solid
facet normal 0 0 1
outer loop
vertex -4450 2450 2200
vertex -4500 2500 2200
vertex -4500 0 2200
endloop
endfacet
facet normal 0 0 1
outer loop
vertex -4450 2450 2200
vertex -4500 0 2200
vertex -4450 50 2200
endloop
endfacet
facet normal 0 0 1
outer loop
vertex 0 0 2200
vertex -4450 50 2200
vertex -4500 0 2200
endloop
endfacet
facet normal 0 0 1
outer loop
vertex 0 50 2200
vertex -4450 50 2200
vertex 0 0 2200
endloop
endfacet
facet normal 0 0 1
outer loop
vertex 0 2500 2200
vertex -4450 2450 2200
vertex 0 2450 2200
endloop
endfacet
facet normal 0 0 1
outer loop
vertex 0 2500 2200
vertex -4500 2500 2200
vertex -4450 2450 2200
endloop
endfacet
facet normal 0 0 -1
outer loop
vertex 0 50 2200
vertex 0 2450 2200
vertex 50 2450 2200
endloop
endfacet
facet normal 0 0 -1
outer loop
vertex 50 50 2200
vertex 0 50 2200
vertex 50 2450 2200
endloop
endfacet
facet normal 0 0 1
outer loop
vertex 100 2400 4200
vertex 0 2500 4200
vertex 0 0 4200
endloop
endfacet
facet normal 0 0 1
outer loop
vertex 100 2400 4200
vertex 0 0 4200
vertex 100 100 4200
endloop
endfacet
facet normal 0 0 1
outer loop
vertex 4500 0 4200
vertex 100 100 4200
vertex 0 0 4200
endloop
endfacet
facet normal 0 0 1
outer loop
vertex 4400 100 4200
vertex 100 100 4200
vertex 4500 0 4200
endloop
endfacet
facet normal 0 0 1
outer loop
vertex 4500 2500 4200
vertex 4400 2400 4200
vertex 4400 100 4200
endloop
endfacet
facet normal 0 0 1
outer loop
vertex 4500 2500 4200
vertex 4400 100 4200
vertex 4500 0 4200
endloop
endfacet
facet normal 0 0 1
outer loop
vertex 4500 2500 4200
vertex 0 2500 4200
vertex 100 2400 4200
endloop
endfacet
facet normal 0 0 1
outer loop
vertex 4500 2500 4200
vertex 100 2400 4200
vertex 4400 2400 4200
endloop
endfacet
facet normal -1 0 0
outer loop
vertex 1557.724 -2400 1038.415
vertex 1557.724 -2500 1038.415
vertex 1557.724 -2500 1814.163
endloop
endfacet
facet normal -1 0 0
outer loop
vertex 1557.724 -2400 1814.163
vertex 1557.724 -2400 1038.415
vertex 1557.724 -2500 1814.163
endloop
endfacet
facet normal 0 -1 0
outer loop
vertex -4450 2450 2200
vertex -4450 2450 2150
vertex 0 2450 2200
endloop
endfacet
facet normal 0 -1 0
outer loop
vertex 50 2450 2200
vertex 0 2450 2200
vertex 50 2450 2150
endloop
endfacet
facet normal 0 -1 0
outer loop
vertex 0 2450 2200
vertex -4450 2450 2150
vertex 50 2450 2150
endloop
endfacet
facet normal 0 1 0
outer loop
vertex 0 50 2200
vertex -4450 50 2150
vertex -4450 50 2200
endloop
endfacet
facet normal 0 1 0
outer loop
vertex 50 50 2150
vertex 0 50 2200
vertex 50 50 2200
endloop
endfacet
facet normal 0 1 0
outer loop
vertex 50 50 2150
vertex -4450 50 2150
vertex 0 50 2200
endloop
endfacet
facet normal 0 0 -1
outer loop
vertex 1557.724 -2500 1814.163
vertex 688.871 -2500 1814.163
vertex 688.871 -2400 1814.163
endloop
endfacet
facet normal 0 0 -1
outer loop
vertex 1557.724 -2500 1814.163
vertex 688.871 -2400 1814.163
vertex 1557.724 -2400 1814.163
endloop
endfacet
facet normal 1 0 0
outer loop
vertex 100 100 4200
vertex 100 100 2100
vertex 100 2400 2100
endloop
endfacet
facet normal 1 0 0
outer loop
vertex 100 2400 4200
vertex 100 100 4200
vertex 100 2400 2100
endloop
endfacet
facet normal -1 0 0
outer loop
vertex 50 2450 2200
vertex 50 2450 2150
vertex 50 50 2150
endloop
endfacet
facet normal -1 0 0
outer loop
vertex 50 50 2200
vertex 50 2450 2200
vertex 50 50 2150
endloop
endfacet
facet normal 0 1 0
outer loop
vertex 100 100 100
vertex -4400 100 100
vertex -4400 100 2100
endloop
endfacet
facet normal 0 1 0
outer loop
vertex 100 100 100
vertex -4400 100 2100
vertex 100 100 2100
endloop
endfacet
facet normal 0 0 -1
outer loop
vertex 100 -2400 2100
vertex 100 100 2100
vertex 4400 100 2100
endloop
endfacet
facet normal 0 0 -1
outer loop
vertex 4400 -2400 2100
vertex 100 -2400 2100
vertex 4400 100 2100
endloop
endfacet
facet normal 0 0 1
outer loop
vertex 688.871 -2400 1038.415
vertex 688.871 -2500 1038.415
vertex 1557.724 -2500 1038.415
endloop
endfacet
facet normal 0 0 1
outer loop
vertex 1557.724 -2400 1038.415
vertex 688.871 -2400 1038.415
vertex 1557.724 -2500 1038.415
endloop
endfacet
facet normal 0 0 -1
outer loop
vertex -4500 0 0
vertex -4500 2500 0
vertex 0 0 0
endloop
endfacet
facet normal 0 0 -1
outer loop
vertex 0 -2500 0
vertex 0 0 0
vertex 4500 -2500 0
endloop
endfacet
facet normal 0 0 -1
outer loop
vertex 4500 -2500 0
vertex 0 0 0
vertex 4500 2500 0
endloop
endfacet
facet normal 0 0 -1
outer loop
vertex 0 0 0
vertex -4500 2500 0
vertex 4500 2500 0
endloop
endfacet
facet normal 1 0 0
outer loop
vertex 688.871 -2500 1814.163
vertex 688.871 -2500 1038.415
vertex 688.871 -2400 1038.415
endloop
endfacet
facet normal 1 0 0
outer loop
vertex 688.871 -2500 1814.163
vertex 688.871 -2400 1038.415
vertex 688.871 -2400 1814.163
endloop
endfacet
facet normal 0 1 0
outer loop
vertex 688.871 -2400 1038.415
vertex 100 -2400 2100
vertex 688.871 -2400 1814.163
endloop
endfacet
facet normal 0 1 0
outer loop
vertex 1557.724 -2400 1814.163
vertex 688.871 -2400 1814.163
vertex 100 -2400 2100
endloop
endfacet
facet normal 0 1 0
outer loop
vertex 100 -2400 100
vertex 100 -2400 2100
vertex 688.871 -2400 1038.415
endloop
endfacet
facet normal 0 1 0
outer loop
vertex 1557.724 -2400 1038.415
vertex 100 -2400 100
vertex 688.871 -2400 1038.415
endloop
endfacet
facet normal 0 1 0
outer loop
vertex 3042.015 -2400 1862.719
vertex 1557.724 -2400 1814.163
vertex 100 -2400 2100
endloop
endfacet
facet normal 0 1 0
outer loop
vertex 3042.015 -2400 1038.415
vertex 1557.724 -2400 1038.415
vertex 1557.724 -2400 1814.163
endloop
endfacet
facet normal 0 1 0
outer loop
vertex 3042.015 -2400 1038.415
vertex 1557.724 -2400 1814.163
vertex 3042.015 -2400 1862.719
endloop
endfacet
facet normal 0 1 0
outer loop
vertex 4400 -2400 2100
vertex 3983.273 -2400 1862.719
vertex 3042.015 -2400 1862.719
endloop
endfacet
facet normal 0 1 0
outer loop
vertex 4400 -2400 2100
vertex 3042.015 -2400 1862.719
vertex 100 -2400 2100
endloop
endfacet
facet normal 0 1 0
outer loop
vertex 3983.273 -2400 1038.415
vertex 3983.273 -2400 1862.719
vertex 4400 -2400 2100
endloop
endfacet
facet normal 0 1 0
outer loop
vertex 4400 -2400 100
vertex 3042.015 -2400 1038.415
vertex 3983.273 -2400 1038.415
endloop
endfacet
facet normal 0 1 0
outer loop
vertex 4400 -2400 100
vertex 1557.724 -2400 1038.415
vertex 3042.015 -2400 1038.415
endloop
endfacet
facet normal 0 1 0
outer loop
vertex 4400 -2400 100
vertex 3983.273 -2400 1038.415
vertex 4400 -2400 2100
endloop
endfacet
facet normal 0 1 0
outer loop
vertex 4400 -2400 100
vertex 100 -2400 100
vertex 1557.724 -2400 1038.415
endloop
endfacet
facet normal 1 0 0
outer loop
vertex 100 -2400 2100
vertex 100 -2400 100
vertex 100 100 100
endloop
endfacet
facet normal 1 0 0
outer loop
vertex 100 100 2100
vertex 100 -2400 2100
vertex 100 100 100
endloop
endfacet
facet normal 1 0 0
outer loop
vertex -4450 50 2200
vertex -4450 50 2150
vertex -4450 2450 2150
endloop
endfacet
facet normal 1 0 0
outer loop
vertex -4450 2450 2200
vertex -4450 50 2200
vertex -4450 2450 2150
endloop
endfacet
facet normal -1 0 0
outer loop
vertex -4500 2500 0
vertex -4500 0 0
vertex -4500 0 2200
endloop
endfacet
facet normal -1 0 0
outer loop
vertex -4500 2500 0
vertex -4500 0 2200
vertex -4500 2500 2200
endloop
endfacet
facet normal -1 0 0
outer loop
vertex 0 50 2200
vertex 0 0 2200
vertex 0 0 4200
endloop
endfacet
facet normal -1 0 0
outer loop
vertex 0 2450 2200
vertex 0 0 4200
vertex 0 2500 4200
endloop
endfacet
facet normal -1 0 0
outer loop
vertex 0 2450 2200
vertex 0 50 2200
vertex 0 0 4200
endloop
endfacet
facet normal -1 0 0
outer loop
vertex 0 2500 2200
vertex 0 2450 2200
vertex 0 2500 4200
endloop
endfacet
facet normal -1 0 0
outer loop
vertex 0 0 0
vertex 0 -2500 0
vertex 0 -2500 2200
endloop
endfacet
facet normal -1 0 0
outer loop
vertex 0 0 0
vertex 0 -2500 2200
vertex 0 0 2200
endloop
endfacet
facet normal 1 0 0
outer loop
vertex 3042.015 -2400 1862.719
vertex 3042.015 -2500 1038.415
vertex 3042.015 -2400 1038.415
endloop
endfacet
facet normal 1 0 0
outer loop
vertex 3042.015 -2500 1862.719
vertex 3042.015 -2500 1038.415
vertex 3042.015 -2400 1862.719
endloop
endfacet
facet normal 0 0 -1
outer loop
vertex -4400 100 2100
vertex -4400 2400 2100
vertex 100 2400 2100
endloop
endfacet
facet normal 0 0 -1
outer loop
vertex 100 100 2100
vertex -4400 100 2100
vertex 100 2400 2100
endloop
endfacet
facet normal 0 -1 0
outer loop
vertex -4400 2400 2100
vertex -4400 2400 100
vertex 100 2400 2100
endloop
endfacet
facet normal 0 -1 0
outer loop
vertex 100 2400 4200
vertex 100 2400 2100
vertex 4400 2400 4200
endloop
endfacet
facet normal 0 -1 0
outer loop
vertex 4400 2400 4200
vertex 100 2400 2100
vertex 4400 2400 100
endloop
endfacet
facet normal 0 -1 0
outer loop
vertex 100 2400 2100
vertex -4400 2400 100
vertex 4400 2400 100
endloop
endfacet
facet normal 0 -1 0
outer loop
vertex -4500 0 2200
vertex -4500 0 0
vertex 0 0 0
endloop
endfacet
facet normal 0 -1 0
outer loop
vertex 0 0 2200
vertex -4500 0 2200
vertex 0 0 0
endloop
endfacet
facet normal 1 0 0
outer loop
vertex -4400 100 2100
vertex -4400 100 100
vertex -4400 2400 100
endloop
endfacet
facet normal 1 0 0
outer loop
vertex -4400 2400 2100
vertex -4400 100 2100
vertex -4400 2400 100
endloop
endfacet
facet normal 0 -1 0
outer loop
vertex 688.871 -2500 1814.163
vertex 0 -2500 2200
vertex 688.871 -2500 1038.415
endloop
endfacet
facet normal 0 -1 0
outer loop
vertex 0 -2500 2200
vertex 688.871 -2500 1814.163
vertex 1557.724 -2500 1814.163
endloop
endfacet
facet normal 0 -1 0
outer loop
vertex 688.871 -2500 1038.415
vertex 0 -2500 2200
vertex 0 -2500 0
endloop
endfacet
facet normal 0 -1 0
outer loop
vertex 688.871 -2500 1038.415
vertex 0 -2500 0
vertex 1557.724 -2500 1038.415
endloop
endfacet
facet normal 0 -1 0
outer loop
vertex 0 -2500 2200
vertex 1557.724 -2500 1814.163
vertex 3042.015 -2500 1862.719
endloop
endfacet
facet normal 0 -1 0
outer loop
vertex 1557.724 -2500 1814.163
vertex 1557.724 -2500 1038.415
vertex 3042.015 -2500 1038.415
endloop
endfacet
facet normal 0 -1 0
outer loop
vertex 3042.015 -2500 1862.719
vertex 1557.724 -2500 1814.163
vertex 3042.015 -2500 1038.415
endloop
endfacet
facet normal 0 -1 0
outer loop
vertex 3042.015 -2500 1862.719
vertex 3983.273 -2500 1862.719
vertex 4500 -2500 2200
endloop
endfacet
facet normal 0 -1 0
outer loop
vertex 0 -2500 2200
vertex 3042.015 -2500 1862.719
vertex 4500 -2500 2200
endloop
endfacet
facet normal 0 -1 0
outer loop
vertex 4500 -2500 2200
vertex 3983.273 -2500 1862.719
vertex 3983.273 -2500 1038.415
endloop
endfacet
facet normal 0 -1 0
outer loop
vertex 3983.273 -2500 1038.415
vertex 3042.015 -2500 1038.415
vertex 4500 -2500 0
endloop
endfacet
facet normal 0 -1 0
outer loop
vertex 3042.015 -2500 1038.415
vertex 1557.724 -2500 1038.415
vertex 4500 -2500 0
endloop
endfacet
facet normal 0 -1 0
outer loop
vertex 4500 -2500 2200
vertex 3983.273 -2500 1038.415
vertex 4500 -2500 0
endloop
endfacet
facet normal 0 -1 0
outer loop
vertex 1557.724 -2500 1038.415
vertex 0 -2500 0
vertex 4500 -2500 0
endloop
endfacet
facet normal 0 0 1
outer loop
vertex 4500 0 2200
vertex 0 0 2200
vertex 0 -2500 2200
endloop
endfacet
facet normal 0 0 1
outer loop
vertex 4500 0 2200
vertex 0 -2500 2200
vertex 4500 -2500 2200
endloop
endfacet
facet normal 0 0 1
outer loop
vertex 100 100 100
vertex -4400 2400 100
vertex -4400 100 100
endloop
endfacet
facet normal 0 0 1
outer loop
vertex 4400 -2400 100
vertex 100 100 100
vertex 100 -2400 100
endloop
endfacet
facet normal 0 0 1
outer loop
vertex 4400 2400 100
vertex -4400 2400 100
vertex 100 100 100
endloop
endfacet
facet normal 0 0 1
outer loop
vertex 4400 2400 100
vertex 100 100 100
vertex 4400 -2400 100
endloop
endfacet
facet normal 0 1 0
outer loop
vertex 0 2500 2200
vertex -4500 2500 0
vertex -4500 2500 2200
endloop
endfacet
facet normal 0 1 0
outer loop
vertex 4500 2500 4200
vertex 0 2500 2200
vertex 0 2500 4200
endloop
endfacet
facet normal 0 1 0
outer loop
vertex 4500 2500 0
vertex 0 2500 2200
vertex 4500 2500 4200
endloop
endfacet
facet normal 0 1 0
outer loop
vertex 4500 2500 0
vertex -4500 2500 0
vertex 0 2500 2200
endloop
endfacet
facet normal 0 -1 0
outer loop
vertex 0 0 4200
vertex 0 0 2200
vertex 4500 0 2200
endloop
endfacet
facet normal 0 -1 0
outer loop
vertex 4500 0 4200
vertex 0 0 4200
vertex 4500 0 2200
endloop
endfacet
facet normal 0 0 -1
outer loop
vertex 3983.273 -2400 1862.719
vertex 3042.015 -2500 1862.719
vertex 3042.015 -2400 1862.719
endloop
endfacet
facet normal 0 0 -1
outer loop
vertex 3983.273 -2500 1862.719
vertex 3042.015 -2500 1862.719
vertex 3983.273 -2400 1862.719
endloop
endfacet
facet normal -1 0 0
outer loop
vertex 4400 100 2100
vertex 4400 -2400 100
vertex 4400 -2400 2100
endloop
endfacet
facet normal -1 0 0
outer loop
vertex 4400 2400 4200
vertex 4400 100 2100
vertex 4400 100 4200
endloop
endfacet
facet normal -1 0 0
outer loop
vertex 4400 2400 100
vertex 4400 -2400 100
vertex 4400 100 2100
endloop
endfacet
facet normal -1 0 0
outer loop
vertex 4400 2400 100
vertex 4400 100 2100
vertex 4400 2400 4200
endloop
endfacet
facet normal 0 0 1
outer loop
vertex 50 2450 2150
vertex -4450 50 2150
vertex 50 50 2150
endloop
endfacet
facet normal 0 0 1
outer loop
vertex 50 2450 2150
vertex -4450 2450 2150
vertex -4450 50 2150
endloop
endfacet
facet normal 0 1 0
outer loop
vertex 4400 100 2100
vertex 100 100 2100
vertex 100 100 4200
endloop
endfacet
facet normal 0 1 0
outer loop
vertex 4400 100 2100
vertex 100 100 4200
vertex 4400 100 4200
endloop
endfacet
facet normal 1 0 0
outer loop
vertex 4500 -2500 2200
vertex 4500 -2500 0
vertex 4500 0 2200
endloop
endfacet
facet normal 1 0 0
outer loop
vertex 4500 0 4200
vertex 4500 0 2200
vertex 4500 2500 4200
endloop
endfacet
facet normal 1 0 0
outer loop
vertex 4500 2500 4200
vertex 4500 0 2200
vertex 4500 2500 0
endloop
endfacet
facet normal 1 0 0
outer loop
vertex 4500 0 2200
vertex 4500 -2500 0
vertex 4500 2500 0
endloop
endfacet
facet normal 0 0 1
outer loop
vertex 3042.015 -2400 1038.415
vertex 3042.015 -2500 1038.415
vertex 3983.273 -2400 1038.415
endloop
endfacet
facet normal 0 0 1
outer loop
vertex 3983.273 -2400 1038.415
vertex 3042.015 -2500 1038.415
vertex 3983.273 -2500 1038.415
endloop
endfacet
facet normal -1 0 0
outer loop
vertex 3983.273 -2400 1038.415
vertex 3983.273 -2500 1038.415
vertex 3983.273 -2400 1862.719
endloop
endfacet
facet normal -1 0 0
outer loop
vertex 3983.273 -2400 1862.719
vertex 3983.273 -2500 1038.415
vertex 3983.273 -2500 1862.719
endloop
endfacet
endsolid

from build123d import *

# Parameters (mm, degrees)
F0_W         = 4500
F0_H         = 2500
F1_DEPTH     = 4200
F2_DEPTH     = 2200
F3_DEPTH     = 2200
F4_T         = -100
F5_T         = 50
F5_T3_DEPTH  = 2300
F5_T5_DEPTH  = 4600
F5_T7_DEPTH  = 2200
F5_T9_DEPTH  = 4200
F5_T11_DEPTH = 8900
F5_T13_DEPTH = 2100
F5_T15_DEPTH = 4600
F5_T17_DEPTH = 4900
F5_T19_DEPTH = 4400
F5_T21_DEPTH = 2600
F5_T23_DEPTH = 2400
F6_W         = 868.8530921936
F6_H         = 775.7483720779
F6_W_2       = 941.2586688995
F6_H_2       = 824.3043422699
F7_DEPTH     = 100


# Not quite as in the source:
# - a shell that OpenCascade refuses in one call is made with other operations: the cavity is built on its own and cut out


with BuildPart() as f1:
    # F0 (on Top) → F1 (new body)
    with BuildSketch(Plane.XY):
        with Locations((2250, 1250)):
            Rectangle(F0_W, F0_H)
    extrude(amount=F1_DEPTH)

    # F0 (on Top) → F2 (join)
    with BuildSketch(Plane.XY):
        with Locations((2250, -1250)):
            Rectangle(F0_W, F0_H)
    extrude(amount=F2_DEPTH)

    # F0 (on Top) → F3 (join)
    with BuildSketch(Plane.XY):
        with Locations((-2250, 1250)):
            Rectangle(F0_W, F0_H)
    extrude(amount=F3_DEPTH)

    # F4
    f4_openings = [f1.faces().sort_by_distance(p)[0] for p in [
        (2250, 1250, 4200),
    ]]
    offset(amount=F4_T, openings=f4_openings, kind=Kind.INTERSECTION)

    # F5: shell of thickness 50, made by hand


with BuildPart() as f5_core1:
    # F5_t2: copy of F1
    add(f1.part)

    # the walls: a layer under each face that stays
    f5_faces = [f5_core1.faces().sort_by_distance(p)[0] for p in [
        (0, 1250, 3200),
        (0, 2500, 2100),
        (-3000, 1666.6666666667, 0),
        (-2250, 0, 1100),
        (2250, -2500, 1100),
        (2250, -1250, 2200),
        (0, -1250, 1100),
        (-4500, 1250, 1100),
        (4500, 0, 2100),
        (2250, 0, 3200),
        (150, 83.3333333333, 4200),
        (100, 1250, 3150),
        (2933.3333333333, 2400, 3516.6666666667),
        (-2933.3333333333, 1600, 100),
        (-2150, 100, 1100),
        (2250, -2400, 1100),
        (2250, -1150, 2100),
        (100, -1150, 1100),
        (-4400, 1250, 1100),
        (4400, -1600, 783.3333333333),
        (2250, 100, 3150),
        (-2150, 1250, 2100),
    ]]
    thicken(f5_faces, amount=-F5_T, mode=Mode.SUBTRACT)

    # F5_s4 → F5_t3 (cut)
    with BuildSketch(Plane.XY.offset(-50)):
        Polygon((-0.5, -0.5), (0, 50), (50, 50), (50, 0), align=None)
    extrude(amount=F5_T3_DEPTH, mode=Mode.SUBTRACT)

    # F5_s6 → F5_t5 (cut)
    with BuildSketch(Plane.YZ.offset(-50)):
        Polygon((-0.5, 2200.5), (0, 2150), (50, 2150), (50, 2200), align=None)
    extrude(amount=F5_T5_DEPTH, mode=Mode.SUBTRACT)

    # F5_s8 → F5_t7 (cut)
    with BuildSketch(Plane.XY.offset(2050)):
        Polygon((100.5, 100.5), (50, 100), (50, 50), (100, 50), align=None)
        Polygon((100.5, 2399.5), (50, 2400), (50, 2450), (100, 2450), align=None)
        Polygon((4399.5, 100.5), (4450, 100), (4450, 50), (4400, 50), align=None)
    extrude(amount=F5_T7_DEPTH, mode=Mode.SUBTRACT)

    # F5_s10 → F5_t9 (cut)
    with BuildSketch(Plane.XY.offset(50)):
        Polygon((4399.5, 2399.5), (4400, 2450), (4450, 2450), (4450, 2400), align=None)
    extrude(amount=F5_T9_DEPTH, mode=Mode.SUBTRACT)

    # F5_s12 → F5_t11 (cut)
    with BuildSketch(Plane.YZ.offset(-4450)):
        Polygon((2399.5, 100.5), (2450, 100), (2450, 50), (2400, 50), align=None)
    extrude(amount=F5_T11_DEPTH, mode=Mode.SUBTRACT)

    # F5_s14 → F5_t13 (cut)
    with BuildSketch(Plane.XY.offset(50)):
        Polygon((-4399.5, 2399.5), (-4400, 2450), (-4450, 2450), (-4450, 2400), align=None)
        Polygon((-4399.5, 100.5), (-4400, 50), (-4450, 50), (-4450, 100), align=None)
        Polygon((4399.5, -2399.5), (4400, -2450), (4450, -2450), (4450, -2400), align=None)
        Polygon((100.5, -2399.5), (100, -2450), (50, -2450), (50, -2400), align=None)
    extrude(amount=F5_T13_DEPTH, mode=Mode.SUBTRACT)

    # F5_s16 → F5_t15 (cut)
    with BuildSketch(Plane.YZ.offset(-4450)):
        Polygon((2399.5, 2099.5), (2450, 2100), (2450, 2150), (2400, 2150), align=None)
        Polygon((100.5, 100.5), (100, 50), (50, 50), (50, 100), align=None)
        Polygon((100.5, 2099.5), (50, 2100), (50, 2150), (100, 2150), align=None)
    extrude(amount=F5_T15_DEPTH, mode=Mode.SUBTRACT)

    # F5_s18 → F5_t17 (cut)
    with BuildSketch(Plane.XZ.offset(-2450)):
        Polygon((4399.5, 100.5), (4400, 50), (4450, 50), (4450, 100), align=None)
    extrude(amount=F5_T17_DEPTH, mode=Mode.SUBTRACT)

    # F5_s20 → F5_t19 (cut)
    with BuildSketch(Plane.YZ.offset(50)):
        Polygon((-2399.5, 100.5), (-2400, 50), (-2450, 50), (-2450, 100), align=None)
        Polygon((-2399.5, 2099.5), (-2450, 2100), (-2450, 2150), (-2400, 2150), align=None)
    extrude(amount=F5_T19_DEPTH, mode=Mode.SUBTRACT)

    # F5_s22 → F5_t21 (cut)
    with BuildSketch(Plane.XZ.offset(-150)):
        Polygon((100.5, 100.5), (100, 50), (50, 50), (50, 100), align=None)
        Polygon((100.5, 2099.5), (100, 2150), (50, 2150), (50, 2100), align=None)
        Polygon((4399.5, 2099.5), (4400, 2150), (4450, 2150), (4450, 2100), align=None)
    extrude(amount=F5_T21_DEPTH, mode=Mode.SUBTRACT)

    # F5_s24 → F5_t23 (cut)
    with BuildSketch(Plane.XZ.offset(-2450)):
        Polygon((-4399.5, 100.5), (-4400, 50), (-4450, 50), (-4450, 100), align=None)
        Polygon((-4399.5, 2099.5), (-4450, 2100), (-4450, 2150), (-4400, 2150), align=None)
    extrude(amount=F5_T23_DEPTH, mode=Mode.SUBTRACT)


with BuildPart() as f1_1:
    add(f1.part)

    # what is left inside the walls is the cavity
    f5_cavity = [f5_core1.part.solids().sort_by_distance(p)[0] for p in [
        (-2200, 850, 2199.5),
    ]]
    add(f5_cavity, mode=Mode.SUBTRACT)

    # F6 (on face) → F7 (cut, through all)
    with BuildSketch(Plane.XZ.offset(2500)):
        with Locations((1123.2978105545, 1426.2890219688)):
            Rectangle(F6_W, F6_H)
        with Locations((3512.6439332962, 1450.5670070648)):
            Rectangle(F6_W_2, F6_H_2)
    extrude(amount=-F7_DEPTH, mode=Mode.SUBTRACT)


solid = f1_1.part
